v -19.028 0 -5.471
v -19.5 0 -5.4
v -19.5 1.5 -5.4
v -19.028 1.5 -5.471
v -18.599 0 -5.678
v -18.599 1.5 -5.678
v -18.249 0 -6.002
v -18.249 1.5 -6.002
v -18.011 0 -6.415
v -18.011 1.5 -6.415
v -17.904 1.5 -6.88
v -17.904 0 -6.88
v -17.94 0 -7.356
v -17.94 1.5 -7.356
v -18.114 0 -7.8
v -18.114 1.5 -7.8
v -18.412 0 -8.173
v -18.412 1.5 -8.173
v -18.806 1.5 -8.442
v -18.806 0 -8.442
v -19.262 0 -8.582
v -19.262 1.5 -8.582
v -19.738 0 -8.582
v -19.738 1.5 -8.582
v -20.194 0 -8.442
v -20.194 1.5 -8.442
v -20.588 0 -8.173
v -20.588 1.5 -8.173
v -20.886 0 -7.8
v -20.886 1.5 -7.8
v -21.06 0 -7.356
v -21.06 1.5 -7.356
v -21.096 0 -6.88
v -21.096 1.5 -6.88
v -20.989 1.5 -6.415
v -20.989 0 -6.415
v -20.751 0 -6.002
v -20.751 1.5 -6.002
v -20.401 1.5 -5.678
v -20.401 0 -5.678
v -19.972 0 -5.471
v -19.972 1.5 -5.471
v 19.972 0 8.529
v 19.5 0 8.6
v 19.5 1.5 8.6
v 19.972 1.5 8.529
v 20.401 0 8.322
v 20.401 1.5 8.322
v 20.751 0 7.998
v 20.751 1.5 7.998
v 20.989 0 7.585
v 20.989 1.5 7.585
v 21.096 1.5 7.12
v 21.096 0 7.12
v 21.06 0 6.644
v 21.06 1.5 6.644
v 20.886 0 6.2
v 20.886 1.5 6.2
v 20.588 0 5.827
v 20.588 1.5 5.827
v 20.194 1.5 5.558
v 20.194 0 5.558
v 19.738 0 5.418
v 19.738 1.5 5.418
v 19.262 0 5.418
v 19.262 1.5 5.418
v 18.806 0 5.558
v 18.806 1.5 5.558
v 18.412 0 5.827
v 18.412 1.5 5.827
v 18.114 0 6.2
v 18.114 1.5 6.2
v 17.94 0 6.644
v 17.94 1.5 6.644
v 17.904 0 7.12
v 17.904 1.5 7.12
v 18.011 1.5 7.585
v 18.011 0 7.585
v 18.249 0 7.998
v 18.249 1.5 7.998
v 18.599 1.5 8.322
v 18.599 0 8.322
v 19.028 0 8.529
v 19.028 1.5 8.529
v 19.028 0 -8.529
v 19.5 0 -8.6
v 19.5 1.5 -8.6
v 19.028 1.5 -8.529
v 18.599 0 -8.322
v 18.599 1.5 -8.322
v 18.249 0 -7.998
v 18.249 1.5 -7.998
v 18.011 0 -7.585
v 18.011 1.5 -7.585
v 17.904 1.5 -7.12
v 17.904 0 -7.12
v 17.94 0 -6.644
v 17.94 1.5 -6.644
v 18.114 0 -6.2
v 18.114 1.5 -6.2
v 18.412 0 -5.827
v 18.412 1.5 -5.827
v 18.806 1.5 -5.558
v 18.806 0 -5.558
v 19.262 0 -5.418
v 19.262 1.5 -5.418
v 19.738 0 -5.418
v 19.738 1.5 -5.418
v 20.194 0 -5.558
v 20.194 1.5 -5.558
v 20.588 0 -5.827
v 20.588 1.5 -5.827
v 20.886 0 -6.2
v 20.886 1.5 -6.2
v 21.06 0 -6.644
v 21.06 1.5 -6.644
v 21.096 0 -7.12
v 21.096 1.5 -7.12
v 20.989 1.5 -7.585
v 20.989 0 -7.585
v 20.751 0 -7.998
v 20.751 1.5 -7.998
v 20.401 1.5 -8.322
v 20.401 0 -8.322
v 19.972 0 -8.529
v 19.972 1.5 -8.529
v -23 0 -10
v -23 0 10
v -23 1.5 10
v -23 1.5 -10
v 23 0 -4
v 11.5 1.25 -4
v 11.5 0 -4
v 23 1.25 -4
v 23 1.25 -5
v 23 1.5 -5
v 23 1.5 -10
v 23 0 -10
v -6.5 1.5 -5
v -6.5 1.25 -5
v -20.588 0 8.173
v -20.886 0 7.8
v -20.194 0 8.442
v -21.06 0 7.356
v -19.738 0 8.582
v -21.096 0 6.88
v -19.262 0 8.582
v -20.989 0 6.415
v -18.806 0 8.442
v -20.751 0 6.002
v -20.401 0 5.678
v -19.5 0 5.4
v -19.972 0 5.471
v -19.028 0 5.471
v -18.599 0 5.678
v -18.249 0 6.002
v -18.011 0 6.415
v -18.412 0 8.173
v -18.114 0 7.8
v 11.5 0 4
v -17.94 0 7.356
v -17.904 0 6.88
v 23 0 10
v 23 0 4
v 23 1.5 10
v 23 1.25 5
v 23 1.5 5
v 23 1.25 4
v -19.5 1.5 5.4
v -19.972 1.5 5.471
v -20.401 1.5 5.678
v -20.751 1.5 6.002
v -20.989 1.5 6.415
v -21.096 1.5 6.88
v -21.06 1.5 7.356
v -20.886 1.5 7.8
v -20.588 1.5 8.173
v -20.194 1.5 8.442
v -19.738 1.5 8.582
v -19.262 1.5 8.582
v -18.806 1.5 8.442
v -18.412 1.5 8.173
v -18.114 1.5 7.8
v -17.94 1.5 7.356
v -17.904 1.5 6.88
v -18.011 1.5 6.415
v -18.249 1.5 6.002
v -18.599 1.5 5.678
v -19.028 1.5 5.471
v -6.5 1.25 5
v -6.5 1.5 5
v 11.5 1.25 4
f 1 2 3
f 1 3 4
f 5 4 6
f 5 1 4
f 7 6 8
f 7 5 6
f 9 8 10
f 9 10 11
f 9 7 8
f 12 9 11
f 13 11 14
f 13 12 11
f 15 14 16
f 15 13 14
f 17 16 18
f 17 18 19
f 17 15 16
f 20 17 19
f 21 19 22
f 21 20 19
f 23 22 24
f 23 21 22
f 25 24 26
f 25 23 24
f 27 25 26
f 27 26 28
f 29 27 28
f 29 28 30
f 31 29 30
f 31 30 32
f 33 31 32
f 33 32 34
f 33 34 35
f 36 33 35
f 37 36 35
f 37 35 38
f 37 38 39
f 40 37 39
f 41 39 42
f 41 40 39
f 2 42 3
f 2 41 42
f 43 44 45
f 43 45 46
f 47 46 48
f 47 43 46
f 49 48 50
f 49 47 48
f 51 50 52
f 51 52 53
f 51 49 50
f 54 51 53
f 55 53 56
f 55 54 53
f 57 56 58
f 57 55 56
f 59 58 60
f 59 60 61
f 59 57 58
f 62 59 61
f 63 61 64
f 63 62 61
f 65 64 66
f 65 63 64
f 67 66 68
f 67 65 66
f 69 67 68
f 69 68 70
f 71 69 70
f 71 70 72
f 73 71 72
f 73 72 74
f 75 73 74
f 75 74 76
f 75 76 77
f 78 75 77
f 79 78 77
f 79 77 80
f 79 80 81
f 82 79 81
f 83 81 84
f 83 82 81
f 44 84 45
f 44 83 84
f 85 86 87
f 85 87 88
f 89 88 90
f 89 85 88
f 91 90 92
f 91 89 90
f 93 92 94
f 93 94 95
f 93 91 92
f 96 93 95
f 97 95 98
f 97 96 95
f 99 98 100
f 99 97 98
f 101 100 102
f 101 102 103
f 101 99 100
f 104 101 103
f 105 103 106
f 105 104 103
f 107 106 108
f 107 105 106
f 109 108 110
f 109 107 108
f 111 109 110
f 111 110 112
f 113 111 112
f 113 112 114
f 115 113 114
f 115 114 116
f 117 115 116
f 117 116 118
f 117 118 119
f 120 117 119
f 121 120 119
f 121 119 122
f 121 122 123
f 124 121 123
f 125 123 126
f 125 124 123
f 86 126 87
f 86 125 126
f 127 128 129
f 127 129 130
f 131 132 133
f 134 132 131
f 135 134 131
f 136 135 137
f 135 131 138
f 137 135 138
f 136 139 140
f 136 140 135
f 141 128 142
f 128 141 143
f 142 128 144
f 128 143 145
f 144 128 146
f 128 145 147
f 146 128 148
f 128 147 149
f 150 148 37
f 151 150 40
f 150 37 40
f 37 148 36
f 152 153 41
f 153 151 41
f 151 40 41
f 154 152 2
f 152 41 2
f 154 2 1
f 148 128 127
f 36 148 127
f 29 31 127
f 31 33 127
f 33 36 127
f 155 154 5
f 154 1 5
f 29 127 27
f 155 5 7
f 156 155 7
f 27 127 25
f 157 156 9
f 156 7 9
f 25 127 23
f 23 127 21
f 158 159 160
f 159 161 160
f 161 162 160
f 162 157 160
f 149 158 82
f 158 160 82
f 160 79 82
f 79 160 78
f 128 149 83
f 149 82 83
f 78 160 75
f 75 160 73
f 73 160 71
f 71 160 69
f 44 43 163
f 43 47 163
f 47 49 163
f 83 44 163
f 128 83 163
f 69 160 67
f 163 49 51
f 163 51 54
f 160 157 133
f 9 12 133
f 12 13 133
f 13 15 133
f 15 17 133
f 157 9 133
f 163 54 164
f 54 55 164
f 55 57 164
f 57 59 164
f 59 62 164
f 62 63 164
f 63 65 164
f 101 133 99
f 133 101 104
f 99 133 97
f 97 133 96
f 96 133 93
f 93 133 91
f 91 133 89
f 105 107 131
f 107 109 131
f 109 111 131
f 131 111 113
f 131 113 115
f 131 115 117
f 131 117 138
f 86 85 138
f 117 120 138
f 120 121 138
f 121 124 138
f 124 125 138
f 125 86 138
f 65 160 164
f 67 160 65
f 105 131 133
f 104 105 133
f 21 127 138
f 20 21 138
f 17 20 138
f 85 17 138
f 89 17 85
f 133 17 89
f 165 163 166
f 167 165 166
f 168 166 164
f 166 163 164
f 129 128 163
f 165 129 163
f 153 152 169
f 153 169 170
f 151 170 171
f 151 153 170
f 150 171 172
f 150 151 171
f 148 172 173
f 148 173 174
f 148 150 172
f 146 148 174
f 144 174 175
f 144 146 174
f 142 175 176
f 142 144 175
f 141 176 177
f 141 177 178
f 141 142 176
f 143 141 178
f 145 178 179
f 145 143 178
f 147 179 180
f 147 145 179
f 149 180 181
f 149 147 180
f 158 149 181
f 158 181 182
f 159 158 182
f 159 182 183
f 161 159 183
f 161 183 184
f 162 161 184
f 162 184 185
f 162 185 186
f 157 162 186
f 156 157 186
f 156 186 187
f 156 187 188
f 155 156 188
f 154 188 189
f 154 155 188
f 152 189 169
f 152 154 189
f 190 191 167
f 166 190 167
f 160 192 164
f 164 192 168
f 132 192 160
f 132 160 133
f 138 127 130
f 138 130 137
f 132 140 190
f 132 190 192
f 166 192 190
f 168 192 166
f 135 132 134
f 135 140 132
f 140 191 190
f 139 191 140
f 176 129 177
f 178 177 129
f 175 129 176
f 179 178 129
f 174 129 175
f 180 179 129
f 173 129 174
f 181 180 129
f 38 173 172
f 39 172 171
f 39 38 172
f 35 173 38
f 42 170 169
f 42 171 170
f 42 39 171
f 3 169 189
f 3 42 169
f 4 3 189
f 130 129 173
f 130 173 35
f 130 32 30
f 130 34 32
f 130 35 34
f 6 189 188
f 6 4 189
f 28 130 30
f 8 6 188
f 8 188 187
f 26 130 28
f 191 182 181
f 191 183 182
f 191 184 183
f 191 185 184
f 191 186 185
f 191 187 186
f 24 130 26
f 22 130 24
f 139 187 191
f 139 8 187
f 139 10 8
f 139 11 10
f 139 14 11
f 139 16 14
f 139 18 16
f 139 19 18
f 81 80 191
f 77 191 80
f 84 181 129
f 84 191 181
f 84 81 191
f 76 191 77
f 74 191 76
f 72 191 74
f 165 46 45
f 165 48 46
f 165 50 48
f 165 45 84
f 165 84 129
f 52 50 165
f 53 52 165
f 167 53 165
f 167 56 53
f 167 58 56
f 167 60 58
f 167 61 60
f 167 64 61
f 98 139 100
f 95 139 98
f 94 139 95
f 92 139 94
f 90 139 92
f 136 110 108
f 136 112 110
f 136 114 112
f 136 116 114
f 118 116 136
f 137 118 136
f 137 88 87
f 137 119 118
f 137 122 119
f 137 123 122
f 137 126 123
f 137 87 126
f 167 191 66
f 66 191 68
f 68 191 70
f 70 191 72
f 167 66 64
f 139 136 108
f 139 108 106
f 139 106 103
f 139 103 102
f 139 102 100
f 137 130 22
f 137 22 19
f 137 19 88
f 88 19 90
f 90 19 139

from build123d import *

# Parameters (mm, degrees)
SKETCH_1_W          = 46
SKETCH_1_H          = 20
SKETCH_1_R          = 1.6
EXTRUDE_1_DEPTH     = 1.5
SKETCH_2_W          = 29.5
SKETCH_2_H          = 10
CUT_EXTRUDE_1_DEPTH = 0.25
SKETCH_3_W          = 11.5
SKETCH_3_H          = 8
CUT_EXTRUDE_2_DEPTH = 30.25


with BuildPart() as part:
    # 草图1 → 凸台-拉伸1 (new body)
    with BuildSketch(Plane(origin=(0, 0, 0), x_dir=(1, 0, 0), z_dir=(0, 1, 0))):
        Rectangle(SKETCH_1_W, SKETCH_1_H)
        with Locations(Location((-19.5, 7, 0), (0, 0, 270))):
            Circle(SKETCH_1_R, mode=Mode.SUBTRACT)
        with Locations(Location((19.5, 7, 0), (0, 0, 90))):
            Circle(SKETCH_1_R, mode=Mode.SUBTRACT)
        with Locations(Location((19.5, -7, 0), (0, 0, 270))):
            Circle(SKETCH_1_R, mode=Mode.SUBTRACT)
        with Locations(Location((-19.5, -7, 0), (0, 0, 90))):
            Circle(SKETCH_1_R, mode=Mode.SUBTRACT)
    extrude(amount=EXTRUDE_1_DEPTH)

    # 草图2 → 切除-拉伸1 (cut)
    with BuildSketch(Plane(origin=(0, 1.5, 0), x_dir=(1, 0, 0), z_dir=(0, 1, 0))):
        with Locations((8.25, 0)):
            Rectangle(SKETCH_2_W, SKETCH_2_H)
    extrude(amount=-CUT_EXTRUDE_1_DEPTH, mode=Mode.SUBTRACT)

    # 草图3 → 切除-拉伸2 (cut)
    with BuildSketch(Plane(origin=(0, 1.25, 0), x_dir=(1, 0, 0), z_dir=(0, 1, 0))):
        with Locations((17.25, 0)):
            Rectangle(SKETCH_3_W, SKETCH_3_H)
    extrude(amount=-CUT_EXTRUDE_2_DEPTH, mode=Mode.SUBTRACT)


solid = part.part
